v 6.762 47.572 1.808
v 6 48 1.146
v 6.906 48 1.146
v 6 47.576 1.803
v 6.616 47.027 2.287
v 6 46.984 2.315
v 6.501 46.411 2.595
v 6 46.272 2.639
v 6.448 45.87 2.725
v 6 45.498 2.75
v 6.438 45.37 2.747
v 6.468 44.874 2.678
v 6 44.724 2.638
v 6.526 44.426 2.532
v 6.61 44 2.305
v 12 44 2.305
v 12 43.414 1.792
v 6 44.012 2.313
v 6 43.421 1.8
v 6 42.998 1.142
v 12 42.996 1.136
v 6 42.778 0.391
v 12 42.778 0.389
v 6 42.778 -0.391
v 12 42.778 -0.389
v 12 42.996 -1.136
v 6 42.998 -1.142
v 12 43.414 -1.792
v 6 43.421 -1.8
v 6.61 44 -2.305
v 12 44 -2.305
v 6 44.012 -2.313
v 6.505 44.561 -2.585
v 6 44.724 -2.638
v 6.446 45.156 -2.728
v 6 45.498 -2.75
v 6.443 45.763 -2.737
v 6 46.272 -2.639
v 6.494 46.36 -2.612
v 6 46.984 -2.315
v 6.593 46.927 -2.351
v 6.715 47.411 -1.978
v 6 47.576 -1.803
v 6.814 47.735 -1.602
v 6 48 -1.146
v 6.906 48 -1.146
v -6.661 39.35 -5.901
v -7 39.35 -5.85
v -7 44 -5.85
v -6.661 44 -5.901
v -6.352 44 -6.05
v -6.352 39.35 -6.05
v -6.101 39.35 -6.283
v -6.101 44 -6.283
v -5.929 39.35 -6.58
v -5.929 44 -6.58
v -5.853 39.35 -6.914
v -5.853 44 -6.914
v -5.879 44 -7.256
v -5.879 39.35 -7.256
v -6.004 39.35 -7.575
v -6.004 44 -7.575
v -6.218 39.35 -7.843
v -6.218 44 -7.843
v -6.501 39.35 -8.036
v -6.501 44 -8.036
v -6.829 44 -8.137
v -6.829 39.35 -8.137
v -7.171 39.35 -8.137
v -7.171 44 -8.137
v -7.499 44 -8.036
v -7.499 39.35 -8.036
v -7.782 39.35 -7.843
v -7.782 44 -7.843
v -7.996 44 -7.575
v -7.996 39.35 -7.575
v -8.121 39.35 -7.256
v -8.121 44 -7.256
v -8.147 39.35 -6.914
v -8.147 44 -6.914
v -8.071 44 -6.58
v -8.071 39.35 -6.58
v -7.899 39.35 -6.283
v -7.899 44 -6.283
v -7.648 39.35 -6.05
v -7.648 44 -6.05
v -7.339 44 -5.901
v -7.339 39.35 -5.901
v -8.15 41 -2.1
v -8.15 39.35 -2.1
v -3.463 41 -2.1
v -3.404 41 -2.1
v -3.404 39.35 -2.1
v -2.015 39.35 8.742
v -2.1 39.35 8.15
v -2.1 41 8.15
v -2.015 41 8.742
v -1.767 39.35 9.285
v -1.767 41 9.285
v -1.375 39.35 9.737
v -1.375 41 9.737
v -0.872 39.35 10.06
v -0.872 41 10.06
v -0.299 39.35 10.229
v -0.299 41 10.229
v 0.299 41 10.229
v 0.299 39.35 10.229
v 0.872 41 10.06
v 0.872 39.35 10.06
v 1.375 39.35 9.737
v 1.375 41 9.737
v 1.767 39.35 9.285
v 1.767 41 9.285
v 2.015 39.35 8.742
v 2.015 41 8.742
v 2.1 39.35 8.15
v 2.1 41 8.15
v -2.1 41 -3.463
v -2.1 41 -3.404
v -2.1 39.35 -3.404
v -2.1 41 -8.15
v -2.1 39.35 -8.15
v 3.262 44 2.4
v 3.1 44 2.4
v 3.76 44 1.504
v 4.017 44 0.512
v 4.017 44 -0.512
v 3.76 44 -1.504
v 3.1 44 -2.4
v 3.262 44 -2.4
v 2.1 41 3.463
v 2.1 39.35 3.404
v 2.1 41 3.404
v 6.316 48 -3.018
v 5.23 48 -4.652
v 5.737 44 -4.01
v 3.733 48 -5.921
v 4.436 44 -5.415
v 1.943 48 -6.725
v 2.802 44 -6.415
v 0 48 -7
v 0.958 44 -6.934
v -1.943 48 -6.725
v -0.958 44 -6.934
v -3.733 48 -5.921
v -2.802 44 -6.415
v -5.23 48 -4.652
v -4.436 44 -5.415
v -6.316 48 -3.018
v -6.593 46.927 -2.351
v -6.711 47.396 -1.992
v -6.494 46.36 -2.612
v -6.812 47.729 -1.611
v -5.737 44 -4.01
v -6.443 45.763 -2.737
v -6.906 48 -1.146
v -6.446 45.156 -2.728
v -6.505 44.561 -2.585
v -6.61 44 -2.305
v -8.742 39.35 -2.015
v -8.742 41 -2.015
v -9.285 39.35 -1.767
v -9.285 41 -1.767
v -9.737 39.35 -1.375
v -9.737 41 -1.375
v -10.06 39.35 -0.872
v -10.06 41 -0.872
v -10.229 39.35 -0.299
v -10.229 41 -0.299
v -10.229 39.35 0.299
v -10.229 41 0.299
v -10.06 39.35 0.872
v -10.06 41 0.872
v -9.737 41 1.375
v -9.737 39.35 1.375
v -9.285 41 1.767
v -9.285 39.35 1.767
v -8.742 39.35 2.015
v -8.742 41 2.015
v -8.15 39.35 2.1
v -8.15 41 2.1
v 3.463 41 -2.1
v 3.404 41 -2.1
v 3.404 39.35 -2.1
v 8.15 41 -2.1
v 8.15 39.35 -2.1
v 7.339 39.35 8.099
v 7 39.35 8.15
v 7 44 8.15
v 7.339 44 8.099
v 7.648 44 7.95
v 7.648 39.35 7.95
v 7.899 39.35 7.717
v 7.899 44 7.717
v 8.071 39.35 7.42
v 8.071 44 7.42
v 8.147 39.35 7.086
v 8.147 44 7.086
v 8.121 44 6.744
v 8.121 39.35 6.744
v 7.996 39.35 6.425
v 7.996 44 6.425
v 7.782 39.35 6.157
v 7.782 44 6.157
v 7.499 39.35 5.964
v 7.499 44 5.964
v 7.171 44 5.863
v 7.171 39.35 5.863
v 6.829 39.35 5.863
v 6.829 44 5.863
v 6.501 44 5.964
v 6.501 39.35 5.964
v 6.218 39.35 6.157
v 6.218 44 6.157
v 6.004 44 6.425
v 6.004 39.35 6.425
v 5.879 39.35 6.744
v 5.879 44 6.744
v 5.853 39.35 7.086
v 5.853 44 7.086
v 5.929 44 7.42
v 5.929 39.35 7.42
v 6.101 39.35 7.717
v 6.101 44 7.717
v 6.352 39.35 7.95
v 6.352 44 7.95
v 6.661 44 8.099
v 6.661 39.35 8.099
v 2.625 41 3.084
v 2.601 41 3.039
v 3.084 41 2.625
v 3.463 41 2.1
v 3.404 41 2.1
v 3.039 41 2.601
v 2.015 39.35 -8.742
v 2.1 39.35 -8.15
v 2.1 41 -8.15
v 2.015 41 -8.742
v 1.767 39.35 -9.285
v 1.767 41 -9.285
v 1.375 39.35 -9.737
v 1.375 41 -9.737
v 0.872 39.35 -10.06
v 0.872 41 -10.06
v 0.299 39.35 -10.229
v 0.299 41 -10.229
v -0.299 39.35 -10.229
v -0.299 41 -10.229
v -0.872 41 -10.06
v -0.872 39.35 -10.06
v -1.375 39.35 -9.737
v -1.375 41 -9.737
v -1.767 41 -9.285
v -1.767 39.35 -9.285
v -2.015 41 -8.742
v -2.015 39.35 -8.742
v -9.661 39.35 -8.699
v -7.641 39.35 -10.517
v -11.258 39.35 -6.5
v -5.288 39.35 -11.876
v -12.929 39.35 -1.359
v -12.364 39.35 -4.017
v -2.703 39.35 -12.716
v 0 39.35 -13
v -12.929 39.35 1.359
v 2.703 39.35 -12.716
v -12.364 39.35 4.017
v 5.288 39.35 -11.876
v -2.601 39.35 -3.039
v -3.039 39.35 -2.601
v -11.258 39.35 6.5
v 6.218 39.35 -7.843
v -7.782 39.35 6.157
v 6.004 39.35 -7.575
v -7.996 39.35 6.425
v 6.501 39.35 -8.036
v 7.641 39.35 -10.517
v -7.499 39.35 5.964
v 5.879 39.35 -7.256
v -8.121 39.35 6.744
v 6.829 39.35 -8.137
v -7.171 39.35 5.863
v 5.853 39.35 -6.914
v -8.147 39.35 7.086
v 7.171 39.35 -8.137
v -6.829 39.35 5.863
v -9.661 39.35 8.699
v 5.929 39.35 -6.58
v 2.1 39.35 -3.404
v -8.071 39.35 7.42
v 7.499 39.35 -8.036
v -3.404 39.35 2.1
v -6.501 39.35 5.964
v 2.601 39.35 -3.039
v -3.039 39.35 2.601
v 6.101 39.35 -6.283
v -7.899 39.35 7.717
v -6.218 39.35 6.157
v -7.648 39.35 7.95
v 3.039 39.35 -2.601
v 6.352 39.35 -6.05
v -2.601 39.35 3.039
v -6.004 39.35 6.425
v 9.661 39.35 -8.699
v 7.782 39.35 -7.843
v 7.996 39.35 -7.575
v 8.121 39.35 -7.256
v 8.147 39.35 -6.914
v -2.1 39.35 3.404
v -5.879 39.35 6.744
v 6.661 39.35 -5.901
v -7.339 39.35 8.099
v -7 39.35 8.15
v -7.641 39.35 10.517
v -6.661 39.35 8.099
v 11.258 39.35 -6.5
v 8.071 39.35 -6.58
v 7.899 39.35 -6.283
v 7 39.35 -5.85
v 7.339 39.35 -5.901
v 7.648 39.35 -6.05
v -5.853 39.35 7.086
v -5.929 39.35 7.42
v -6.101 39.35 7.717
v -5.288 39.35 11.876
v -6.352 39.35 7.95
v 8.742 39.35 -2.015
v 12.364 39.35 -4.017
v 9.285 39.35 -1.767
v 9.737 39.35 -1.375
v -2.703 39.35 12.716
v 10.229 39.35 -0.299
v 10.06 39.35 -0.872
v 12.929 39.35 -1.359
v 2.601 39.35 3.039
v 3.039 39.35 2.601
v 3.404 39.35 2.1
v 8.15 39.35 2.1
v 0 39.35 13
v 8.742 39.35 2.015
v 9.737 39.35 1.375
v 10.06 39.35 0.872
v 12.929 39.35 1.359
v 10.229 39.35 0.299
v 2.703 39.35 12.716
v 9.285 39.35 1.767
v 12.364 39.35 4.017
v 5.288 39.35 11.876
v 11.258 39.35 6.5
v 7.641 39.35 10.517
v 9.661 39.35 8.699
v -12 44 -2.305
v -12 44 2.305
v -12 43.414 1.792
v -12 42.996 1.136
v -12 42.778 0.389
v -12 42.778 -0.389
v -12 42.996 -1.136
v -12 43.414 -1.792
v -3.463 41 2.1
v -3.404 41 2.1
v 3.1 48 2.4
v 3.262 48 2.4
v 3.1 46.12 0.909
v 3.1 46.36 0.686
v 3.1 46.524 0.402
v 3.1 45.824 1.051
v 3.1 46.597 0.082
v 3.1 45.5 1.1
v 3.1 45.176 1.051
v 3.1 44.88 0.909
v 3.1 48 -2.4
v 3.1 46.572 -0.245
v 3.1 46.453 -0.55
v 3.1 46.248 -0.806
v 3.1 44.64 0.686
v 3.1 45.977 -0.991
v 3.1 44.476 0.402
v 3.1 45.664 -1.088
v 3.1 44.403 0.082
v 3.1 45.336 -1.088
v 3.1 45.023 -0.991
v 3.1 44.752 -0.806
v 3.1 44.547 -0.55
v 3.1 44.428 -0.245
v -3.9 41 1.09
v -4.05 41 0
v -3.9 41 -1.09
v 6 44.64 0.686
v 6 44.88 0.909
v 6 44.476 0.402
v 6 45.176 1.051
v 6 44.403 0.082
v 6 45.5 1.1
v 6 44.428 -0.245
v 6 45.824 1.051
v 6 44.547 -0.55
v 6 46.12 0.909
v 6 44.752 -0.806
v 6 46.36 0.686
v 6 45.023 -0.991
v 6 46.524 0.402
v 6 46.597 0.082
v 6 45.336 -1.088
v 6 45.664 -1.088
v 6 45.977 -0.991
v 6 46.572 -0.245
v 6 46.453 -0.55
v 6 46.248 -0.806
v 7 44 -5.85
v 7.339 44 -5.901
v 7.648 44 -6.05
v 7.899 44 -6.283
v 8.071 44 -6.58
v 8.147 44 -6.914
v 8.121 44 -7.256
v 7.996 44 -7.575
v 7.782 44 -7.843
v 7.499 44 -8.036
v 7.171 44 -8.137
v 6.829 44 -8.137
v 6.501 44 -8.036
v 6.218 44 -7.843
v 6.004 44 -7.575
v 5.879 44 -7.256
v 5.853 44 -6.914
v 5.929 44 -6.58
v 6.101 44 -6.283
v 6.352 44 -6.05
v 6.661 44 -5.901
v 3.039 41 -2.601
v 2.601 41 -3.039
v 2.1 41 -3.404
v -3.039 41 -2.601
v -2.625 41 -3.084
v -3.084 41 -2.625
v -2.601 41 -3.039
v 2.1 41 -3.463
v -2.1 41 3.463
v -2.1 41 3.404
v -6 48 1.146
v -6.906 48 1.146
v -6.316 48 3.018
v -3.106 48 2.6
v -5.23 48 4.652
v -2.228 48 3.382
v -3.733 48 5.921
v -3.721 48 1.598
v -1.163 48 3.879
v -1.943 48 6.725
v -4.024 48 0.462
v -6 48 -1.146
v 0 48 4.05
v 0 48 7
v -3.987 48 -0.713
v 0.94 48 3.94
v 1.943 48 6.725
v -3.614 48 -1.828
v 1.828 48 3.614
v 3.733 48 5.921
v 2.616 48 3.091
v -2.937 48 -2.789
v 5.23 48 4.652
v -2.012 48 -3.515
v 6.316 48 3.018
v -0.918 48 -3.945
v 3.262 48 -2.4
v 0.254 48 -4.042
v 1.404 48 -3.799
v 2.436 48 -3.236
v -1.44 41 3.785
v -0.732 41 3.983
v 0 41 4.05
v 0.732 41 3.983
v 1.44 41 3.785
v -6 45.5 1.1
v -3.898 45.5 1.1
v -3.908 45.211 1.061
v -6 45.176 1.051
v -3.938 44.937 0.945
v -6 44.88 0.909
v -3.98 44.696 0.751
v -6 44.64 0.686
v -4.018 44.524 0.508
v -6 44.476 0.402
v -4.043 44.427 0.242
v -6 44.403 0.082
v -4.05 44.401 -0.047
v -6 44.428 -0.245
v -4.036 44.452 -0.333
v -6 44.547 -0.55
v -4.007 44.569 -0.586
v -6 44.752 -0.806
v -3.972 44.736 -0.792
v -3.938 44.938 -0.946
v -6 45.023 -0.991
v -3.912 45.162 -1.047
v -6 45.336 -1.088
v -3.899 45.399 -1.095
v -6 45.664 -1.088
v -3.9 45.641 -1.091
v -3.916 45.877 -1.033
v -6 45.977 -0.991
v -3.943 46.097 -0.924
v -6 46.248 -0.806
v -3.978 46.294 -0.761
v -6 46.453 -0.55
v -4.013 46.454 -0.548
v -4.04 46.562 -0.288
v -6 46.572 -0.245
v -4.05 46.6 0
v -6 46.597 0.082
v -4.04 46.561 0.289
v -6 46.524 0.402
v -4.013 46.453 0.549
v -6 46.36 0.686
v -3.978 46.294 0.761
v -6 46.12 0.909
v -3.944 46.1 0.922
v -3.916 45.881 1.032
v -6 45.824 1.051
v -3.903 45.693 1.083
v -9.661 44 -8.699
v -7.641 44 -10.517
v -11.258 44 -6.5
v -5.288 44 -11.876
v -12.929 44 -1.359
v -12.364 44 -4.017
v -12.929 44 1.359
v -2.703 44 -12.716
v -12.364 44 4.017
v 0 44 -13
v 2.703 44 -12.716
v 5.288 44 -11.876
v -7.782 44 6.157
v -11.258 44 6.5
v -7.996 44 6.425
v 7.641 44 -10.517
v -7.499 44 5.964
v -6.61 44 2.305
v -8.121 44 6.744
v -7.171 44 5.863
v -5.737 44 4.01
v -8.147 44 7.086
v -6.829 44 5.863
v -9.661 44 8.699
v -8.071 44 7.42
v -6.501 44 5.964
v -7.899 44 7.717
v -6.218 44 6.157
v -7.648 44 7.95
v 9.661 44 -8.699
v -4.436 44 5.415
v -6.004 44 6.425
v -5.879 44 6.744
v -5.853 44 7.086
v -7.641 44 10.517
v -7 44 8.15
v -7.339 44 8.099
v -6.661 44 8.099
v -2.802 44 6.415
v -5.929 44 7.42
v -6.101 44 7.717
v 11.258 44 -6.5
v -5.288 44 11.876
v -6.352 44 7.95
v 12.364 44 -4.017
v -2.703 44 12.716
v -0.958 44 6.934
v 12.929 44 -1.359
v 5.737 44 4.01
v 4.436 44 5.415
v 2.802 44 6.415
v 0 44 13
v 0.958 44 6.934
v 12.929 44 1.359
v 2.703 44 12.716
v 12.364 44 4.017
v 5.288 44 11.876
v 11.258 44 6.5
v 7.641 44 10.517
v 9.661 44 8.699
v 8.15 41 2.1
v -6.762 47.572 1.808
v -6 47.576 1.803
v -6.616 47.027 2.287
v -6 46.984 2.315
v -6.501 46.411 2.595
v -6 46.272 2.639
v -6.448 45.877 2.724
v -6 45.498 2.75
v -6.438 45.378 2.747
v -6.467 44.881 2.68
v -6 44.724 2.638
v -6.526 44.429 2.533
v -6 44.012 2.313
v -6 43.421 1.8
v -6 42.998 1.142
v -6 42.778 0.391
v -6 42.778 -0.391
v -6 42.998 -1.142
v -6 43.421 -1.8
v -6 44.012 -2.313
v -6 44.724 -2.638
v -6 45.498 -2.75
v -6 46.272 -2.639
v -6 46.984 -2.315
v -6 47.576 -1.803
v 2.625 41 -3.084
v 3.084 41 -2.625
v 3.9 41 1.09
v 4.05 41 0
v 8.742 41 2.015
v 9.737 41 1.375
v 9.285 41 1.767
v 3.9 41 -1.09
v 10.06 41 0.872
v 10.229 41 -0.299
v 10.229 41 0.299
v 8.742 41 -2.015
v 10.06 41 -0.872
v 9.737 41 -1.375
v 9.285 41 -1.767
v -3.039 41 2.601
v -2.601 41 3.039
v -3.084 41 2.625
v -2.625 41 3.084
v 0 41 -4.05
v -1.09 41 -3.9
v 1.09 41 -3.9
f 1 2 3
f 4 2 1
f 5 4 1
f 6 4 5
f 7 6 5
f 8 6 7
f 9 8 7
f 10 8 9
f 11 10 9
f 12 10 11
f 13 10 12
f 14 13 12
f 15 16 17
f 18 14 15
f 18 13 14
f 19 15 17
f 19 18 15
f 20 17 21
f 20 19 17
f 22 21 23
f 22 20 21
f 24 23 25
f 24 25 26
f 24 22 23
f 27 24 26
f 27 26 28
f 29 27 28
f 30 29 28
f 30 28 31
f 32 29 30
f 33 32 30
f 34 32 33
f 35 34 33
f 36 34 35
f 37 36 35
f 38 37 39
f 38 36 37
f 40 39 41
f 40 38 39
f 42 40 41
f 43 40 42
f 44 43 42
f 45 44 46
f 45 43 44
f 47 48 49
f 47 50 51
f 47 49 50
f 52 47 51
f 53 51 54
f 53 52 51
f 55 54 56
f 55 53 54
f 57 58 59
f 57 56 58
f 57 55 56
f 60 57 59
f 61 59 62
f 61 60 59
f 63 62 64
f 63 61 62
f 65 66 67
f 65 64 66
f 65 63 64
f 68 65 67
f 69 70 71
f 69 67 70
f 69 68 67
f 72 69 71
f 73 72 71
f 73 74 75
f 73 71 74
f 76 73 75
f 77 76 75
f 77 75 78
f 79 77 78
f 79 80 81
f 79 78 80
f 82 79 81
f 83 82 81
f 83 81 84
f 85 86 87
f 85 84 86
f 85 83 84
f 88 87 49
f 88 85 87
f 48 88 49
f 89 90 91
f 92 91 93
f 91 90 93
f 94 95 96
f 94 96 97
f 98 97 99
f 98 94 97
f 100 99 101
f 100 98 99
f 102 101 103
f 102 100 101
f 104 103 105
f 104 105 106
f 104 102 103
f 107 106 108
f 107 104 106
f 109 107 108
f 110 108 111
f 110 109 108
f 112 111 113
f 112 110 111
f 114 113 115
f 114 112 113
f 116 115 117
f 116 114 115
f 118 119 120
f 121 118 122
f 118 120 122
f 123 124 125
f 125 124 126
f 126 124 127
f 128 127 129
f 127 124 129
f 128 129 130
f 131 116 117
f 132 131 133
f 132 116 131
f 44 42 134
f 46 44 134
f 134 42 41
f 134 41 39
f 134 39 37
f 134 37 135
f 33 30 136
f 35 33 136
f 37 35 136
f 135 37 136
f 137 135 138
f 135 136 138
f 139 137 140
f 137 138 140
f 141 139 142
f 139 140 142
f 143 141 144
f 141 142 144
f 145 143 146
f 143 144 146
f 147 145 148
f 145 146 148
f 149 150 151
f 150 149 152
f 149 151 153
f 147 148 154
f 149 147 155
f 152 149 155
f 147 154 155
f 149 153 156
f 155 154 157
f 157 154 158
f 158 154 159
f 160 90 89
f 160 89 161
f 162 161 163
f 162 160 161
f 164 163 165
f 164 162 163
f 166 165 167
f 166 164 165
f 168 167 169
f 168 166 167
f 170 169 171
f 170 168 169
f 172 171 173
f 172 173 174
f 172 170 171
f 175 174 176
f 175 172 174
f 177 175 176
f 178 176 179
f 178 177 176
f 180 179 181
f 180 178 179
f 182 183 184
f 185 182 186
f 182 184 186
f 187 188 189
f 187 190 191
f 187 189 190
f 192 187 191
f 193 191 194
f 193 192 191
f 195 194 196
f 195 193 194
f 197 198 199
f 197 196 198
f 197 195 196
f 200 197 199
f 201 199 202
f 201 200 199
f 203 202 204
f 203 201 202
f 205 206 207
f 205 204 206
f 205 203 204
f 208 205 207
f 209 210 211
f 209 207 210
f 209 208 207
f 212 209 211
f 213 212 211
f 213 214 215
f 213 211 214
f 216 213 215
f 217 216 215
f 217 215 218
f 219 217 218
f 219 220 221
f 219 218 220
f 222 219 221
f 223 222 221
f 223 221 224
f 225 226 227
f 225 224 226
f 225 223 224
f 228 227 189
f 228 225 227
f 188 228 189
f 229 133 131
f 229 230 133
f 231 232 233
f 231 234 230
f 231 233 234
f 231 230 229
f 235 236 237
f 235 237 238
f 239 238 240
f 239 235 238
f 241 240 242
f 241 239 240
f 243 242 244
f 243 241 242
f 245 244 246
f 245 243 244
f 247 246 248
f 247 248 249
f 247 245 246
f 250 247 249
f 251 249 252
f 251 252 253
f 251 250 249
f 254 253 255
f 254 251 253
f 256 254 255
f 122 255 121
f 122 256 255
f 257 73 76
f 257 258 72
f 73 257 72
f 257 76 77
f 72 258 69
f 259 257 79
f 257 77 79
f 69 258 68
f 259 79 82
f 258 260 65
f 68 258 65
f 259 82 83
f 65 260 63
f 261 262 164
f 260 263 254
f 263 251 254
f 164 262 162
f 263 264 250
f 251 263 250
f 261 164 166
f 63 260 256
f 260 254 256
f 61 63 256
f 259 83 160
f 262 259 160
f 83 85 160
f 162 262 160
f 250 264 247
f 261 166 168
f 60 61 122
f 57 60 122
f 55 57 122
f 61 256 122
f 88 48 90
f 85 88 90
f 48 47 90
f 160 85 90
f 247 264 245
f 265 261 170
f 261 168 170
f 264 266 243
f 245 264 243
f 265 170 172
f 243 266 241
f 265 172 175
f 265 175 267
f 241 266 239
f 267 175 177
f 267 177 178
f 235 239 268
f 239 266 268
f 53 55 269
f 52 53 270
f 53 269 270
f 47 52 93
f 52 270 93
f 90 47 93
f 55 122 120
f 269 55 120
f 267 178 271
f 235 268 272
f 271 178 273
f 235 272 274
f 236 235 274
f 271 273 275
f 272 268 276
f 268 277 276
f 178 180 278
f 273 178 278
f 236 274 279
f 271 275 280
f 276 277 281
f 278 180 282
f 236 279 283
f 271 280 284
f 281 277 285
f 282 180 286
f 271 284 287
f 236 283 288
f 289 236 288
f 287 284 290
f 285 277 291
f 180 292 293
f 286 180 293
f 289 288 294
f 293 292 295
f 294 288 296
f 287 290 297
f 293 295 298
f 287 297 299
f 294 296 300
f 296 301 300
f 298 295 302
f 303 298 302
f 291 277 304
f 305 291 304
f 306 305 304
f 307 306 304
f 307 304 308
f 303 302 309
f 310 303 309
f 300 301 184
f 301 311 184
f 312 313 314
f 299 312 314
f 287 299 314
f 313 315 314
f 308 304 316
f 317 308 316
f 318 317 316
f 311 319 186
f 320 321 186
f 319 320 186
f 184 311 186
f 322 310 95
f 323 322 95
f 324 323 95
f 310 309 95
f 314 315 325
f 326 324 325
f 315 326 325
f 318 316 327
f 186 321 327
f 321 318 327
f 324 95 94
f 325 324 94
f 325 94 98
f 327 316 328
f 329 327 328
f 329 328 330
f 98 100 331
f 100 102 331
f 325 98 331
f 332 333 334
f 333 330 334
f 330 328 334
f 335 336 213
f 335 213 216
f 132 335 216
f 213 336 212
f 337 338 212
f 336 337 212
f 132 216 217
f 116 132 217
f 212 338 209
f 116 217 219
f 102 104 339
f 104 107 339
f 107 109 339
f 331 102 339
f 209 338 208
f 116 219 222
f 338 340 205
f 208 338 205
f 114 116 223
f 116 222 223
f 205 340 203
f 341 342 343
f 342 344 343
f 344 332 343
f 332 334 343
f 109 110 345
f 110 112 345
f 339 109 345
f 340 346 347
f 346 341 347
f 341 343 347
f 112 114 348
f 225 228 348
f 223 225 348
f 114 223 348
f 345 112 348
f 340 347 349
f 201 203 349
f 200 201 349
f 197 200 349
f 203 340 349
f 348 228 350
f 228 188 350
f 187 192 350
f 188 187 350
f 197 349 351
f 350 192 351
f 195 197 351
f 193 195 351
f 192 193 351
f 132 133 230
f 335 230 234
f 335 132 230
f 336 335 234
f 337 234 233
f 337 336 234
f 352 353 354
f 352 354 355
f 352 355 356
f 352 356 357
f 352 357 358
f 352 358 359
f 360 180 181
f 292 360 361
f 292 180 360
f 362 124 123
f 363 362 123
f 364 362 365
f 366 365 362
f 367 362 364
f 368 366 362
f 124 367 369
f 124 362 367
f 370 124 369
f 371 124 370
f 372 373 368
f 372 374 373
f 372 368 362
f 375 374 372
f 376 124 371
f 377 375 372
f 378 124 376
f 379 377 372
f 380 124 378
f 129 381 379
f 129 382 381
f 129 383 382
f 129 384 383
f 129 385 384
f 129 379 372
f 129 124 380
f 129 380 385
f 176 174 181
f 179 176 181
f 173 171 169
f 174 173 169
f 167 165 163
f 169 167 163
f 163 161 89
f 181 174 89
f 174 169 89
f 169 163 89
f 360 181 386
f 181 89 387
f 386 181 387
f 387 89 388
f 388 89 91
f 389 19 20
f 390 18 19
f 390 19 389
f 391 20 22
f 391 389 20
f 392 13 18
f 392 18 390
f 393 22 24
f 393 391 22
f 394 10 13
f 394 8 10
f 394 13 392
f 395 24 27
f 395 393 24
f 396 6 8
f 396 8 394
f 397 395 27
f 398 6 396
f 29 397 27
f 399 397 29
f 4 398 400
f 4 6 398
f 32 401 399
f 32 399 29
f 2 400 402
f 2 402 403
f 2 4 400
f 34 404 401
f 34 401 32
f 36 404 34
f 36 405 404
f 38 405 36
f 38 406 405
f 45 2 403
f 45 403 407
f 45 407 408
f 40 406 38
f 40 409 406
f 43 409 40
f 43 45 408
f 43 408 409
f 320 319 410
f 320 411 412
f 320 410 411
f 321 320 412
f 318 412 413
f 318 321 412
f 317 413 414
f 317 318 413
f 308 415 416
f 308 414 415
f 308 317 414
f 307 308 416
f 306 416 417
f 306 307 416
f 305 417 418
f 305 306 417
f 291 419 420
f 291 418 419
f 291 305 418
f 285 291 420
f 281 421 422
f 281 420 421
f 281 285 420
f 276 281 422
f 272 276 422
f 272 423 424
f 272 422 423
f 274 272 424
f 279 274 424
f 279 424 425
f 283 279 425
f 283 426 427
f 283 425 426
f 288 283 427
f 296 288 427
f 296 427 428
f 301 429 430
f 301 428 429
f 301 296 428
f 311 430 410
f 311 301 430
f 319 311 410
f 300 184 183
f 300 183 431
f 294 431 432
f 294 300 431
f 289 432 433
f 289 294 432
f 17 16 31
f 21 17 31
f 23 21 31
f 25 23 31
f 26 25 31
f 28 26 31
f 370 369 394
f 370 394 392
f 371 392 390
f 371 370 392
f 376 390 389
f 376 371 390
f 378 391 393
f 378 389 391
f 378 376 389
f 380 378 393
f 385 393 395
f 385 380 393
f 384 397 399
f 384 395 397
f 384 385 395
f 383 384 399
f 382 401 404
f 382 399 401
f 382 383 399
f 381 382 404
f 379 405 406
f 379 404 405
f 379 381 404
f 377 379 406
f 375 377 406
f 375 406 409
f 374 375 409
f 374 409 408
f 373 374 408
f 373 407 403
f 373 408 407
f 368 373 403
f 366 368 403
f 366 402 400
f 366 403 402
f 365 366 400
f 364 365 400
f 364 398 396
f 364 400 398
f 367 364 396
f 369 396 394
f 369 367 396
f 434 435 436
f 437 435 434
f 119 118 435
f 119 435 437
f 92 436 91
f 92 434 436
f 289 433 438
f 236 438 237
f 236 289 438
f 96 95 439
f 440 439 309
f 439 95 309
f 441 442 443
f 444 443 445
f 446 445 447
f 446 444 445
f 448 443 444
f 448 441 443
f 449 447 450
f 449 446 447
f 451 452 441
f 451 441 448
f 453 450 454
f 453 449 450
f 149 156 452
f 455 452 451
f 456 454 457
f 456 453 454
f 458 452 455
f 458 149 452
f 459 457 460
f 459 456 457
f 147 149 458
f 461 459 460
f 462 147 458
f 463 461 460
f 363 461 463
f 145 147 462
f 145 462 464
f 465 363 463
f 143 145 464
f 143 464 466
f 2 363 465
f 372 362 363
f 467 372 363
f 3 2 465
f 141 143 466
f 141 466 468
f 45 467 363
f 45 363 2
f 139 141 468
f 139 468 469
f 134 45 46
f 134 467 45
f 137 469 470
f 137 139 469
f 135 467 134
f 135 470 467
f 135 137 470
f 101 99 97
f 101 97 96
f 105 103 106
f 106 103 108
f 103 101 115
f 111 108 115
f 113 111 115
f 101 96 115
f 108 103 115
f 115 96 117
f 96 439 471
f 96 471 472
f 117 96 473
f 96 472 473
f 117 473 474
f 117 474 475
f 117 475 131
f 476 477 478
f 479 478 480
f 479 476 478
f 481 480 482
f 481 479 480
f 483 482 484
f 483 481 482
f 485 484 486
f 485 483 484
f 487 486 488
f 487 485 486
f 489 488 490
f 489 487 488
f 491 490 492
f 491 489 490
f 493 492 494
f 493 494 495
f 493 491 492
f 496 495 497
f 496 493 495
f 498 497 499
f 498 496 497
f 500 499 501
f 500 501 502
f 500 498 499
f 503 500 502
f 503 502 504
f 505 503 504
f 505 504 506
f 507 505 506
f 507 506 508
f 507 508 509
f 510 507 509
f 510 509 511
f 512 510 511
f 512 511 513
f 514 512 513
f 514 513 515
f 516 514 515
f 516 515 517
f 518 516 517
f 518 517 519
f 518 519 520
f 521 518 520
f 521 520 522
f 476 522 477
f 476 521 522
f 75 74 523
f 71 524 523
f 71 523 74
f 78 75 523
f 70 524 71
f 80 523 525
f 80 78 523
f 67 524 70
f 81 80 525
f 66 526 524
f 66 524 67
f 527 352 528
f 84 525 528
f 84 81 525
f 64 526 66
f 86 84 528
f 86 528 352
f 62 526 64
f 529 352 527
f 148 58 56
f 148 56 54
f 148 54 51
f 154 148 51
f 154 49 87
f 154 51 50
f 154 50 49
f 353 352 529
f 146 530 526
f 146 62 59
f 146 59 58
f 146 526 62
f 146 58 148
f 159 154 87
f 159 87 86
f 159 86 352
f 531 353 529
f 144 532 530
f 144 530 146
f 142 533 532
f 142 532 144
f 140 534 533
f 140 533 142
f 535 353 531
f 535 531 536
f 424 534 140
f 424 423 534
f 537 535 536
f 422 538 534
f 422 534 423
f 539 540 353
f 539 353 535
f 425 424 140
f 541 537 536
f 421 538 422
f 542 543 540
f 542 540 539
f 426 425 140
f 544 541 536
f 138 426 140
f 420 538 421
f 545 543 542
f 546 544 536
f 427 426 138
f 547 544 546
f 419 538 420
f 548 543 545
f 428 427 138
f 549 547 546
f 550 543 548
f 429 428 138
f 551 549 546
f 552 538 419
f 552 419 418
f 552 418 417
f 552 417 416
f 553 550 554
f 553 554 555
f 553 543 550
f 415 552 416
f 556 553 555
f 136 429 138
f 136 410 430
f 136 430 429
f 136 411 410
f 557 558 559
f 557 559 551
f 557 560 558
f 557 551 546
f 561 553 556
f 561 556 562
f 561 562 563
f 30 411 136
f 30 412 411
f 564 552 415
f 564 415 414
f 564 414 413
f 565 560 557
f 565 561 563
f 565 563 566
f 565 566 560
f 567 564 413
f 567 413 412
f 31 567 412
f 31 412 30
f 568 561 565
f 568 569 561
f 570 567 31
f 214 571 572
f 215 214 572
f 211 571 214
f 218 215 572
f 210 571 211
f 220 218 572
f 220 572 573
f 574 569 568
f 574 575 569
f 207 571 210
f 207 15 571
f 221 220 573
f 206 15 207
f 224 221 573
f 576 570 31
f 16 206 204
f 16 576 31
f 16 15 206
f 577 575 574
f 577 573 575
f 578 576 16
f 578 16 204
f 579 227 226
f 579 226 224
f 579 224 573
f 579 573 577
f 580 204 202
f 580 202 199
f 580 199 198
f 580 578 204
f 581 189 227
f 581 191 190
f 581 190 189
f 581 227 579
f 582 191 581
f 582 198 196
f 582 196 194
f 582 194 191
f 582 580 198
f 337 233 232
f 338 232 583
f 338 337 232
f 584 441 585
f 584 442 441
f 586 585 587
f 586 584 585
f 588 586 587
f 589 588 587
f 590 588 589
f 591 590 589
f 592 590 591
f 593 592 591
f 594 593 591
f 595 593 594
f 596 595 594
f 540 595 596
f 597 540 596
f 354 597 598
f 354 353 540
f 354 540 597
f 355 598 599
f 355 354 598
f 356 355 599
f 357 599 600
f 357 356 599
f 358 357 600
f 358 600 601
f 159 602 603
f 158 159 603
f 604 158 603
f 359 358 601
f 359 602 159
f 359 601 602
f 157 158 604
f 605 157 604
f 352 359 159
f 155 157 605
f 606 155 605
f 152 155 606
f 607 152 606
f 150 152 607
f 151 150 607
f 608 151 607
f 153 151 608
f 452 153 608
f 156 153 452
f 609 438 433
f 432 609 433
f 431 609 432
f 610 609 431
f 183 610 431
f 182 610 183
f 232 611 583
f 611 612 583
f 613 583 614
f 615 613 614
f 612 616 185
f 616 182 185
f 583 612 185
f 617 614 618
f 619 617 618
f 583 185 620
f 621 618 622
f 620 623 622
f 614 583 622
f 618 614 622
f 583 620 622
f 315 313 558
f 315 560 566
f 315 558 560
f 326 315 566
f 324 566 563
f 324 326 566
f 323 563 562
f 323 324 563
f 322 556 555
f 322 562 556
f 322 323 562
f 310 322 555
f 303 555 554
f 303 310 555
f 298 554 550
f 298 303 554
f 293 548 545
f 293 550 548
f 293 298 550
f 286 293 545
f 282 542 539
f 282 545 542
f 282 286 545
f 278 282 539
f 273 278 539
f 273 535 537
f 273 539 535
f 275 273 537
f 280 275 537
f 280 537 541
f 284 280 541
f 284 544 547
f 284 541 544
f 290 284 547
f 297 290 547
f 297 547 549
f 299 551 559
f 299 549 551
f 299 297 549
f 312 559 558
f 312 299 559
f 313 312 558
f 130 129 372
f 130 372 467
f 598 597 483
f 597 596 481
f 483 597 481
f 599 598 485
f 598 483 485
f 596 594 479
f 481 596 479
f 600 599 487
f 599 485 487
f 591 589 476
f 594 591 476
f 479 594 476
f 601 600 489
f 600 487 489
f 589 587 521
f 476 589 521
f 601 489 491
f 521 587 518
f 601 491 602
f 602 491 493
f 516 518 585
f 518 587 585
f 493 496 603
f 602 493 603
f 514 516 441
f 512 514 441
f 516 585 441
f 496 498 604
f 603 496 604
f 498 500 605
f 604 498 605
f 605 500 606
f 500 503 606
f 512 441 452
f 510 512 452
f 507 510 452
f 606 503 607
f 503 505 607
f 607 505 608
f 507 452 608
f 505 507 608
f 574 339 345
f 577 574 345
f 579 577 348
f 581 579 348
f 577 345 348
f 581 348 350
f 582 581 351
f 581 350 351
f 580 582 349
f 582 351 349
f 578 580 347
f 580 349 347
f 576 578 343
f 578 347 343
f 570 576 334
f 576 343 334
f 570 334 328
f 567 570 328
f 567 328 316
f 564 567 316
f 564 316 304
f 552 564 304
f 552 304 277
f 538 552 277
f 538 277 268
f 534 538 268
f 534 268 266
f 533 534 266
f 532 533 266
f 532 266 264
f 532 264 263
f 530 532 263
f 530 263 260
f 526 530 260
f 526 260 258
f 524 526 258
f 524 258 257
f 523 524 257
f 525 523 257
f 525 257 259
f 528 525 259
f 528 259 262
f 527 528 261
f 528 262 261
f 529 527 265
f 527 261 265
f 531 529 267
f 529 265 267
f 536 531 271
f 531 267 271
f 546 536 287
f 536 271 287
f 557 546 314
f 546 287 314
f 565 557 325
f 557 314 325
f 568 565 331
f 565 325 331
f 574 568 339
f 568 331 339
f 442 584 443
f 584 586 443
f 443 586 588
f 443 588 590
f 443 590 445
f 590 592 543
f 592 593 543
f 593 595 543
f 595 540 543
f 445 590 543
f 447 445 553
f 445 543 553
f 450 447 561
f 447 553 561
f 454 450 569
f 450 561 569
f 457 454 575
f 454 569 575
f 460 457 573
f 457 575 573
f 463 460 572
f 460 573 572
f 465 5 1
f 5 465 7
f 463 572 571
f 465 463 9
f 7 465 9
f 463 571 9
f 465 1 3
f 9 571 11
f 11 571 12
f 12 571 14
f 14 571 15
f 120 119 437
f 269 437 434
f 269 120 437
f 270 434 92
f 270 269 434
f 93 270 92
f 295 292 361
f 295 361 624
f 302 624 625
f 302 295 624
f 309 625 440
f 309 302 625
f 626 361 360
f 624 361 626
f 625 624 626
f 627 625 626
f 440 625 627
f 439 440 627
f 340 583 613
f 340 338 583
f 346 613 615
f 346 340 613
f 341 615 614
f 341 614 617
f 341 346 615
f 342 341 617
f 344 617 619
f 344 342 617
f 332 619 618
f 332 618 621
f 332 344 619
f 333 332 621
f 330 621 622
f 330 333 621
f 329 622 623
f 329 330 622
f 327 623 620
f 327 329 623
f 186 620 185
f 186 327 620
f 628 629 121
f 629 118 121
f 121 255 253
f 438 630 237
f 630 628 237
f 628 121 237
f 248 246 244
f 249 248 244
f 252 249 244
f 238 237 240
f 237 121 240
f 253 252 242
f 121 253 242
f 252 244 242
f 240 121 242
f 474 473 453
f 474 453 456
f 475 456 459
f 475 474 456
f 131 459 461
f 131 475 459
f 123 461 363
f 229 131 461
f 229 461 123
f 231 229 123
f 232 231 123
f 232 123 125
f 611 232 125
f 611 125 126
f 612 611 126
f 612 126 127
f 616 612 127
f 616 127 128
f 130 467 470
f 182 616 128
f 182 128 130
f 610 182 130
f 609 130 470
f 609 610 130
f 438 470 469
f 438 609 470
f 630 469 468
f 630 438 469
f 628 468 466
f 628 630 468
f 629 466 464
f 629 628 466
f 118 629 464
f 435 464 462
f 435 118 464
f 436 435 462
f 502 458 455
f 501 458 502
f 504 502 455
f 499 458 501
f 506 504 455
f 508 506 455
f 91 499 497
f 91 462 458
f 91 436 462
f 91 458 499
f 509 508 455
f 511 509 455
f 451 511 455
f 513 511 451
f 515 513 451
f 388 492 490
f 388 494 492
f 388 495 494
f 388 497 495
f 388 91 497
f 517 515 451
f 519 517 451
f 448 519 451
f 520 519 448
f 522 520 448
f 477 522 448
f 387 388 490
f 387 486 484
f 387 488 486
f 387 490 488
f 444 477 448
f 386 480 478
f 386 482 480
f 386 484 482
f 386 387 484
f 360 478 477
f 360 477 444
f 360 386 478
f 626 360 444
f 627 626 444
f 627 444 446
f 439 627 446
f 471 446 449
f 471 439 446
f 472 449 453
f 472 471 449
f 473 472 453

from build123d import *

# Parameters (mm, degrees)
STOCK_HORN_DRIVE_FLANGE_START              = 41
STOCK_HORN_DRIVE_FLANGE_PROFILE_R          = 13
STOCK_HORN_DRIVE_FLANGE_PROFILE_R_2        = 4.05
STOCK_HORN_DRIVE_FLANGE_DEPTH              = 3
D_COUPLING_RING_START                      = 44
D_COUPLING_RING_PROFILE_R                  = 7
D_COUPLING_RING_PROFILE_R_2                = 4.05
D_COUPLING_RING_DEPTH                      = 4
D_KEY_LAND_START                           = 44
D_KEY_LAND_PROFILE_W                       = 2.9
D_KEY_LAND_PROFILE_H                       = 4.8
D_KEY_LAND_DEPTH                           = 4
CAPTURED_HORN_KEY_BOSS_START               = 39.35
CAPTURED_HORN_KEY_BOSS_PROFILE_R           = 13
CAPTURED_HORN_KEY_BOSS_DEPTH               = 1.65
KEY_POCKET_HUB_START                       = 39.35
STOCK_HORN_POCKET_HUB_R                    = 3.55
KEY_POCKET_HUB_DEPTH                       = 1.65
KEY_POCKET_HORIZONTAL_START                = 39.35
STOCK_HORN_POCKET_HORIZONTAL_W             = 16.3
STOCK_HORN_POCKET_HORIZONTAL_H             = 4.2
KEY_POCKET_HORIZONTAL_DEPTH                = 1.65
KEY_POCKET_VERTICAL_START                  = 39.35
STOCK_HORN_POCKET_VERTICAL_W               = 4.2
STOCK_HORN_POCKET_VERTICAL_H               = 16.3
KEY_POCKET_VERTICAL_DEPTH                  = 1.65
KEY_POCKET_ROUNDED_TIPS_START              = 39.35
STOCK_HORN_POCKET_ROUNDED_TIPS_R           = 2.1
KEY_POCKET_ROUNDED_TIPS_DEPTH              = 1.65
UNMODIFIED_HORN_CAPTURE_M2_START           = -50
UNMODIFIED_HORN_CAPTURE_M2_PROFILE_R       = 1.15
UNMODIFIED_HORN_CAPTURE_M2_DEPTH           = 102.400389104
HUB_CLEARANCE_IN_KEY_BOSS_ONLY_START       = 39.35
HORN_CENTER_HUB_CLEARANCE_R                = 4
HUB_CLEARANCE_IN_KEY_BOSS_ONLY_DEPTH       = 1.65
YAW_POSITIVE_RETENTION_CROSSBOLT_START     = -10
YAW_POSITIVE_RETENTION_CROSSBOLT_PROFILE_R = 1.1
YAW_POSITIVE_RETENTION_CROSSBOLT_DEPTH     = 62.400389104
CROSSBOLT_FLAT_SEAT_CUT_12_START           = -12
CROSSBOLT_FLAT_SEAT_12_R                   = 2.75
CROSSBOLT_FLAT_SEAT_CUT_12_DEPTH           = 6
CROSSBOLT_FLAT_SEAT_CUT_6_START            = 6
CROSSBOLT_FLAT_SEAT_6_R                    = 2.75
CROSSBOLT_FLAT_SEAT_CUT_6_DEPTH            = 6


with BuildPart() as part:
    # Stock_horn_drive_flange_profile → Stock_horn_drive_flange (new body)
    with BuildSketch(Plane(origin=(0, 0, 0), x_dir=(1, 0, 0), z_dir=(0, 1, 0)).offset(STOCK_HORN_DRIVE_FLANGE_START)):
        with Locations(Location((0, 0, 0), (0, 0, 270))):
            Circle(STOCK_HORN_DRIVE_FLANGE_PROFILE_R)
        with Locations(Location((0, 0, 0), (0, 0, 270))):
            Circle(STOCK_HORN_DRIVE_FLANGE_PROFILE_R_2, mode=Mode.SUBTRACT)
    extrude(amount=STOCK_HORN_DRIVE_FLANGE_DEPTH)

    # D_coupling_ring_profile → D_coupling_ring (add)
    with BuildSketch(Plane(origin=(0, 0, 0), x_dir=(1, 0, 0), z_dir=(0, 1, 0)).offset(D_COUPLING_RING_START)):
        with Locations(Location((0, 0, 0), (0, 0, 270))):
            Circle(D_COUPLING_RING_PROFILE_R)
        with Locations(Location((0, 0, 0), (0, 0, 270))):
            Circle(D_COUPLING_RING_PROFILE_R_2, mode=Mode.SUBTRACT)
    extrude(amount=D_COUPLING_RING_DEPTH)

    # D_key_land_profile → D_key_land (add)
    with BuildSketch(Plane(origin=(0, 0, 0), x_dir=(1, 0, 0), z_dir=(0, 1, 0)).offset(D_KEY_LAND_START)):
        with Locations((4.55, 0)):
            Rectangle(D_KEY_LAND_PROFILE_W, D_KEY_LAND_PROFILE_H)
    extrude(amount=D_KEY_LAND_DEPTH)

    # Captured_horn_key_boss_profile → Captured_horn_key_boss (add)
    with BuildSketch(Plane(origin=(0, 0, 0), x_dir=(1, 0, 0), z_dir=(0, 1, 0)).offset(CAPTURED_HORN_KEY_BOSS_START)):
        with Locations(Location((0, 0, 0), (0, 0, 270))):
            Circle(CAPTURED_HORN_KEY_BOSS_PROFILE_R)
    extrude(amount=CAPTURED_HORN_KEY_BOSS_DEPTH)

    # Stock_horn_pocket_Hub → Key_pocket_Hub (cut)
    with BuildSketch(Plane(origin=(0, 0, 0), x_dir=(1, 0, 0), z_dir=(0, 1, 0)).offset(KEY_POCKET_HUB_START)):
        with Locations(Location((0, 0, 0), (0, 0, 270))):
            Circle(STOCK_HORN_POCKET_HUB_R)
    extrude(amount=KEY_POCKET_HUB_DEPTH, mode=Mode.SUBTRACT)

    # Stock_horn_pocket_Horizontal → Key_pocket_Horizontal (cut)
    with BuildSketch(Plane(origin=(0, 0, 0), x_dir=(1, 0, 0), z_dir=(0, 1, 0)).offset(KEY_POCKET_HORIZONTAL_START)):
        Rectangle(STOCK_HORN_POCKET_HORIZONTAL_W, STOCK_HORN_POCKET_HORIZONTAL_H)
    extrude(amount=KEY_POCKET_HORIZONTAL_DEPTH, mode=Mode.SUBTRACT)

    # Stock_horn_pocket_Vertical → Key_pocket_Vertical (cut)
    with BuildSketch(Plane(origin=(0, 0, 0), x_dir=(1, 0, 0), z_dir=(0, 1, 0)).offset(KEY_POCKET_VERTICAL_START)):
        Rectangle(STOCK_HORN_POCKET_VERTICAL_W, STOCK_HORN_POCKET_VERTICAL_H)
    extrude(amount=KEY_POCKET_VERTICAL_DEPTH, mode=Mode.SUBTRACT)

    # Stock_horn_pocket_Rounded_tips → Key_pocket_Rounded_tips (cut)
    with BuildSketch(Plane(origin=(0, 0, 0), x_dir=(1, 0, 0), z_dir=(0, 1, 0)).offset(KEY_POCKET_ROUNDED_TIPS_START)):
        with Locations((8.15, 0)):
            Circle(STOCK_HORN_POCKET_ROUNDED_TIPS_R)
        with Locations((-8.15, 0)):
            Circle(STOCK_HORN_POCKET_ROUNDED_TIPS_R)
        with Locations((0, 8.15)):
            Circle(STOCK_HORN_POCKET_ROUNDED_TIPS_R)
        with Locations((0, -8.15)):
            Circle(STOCK_HORN_POCKET_ROUNDED_TIPS_R)
    extrude(amount=KEY_POCKET_ROUNDED_TIPS_DEPTH, mode=Mode.SUBTRACT)

    # Unmodified_horn_capture_M2_profile → Unmodified_horn_capture_M2 (cut, through all)
    with BuildSketch(Plane(origin=(0, 0, 0), x_dir=(1, 0, 0), z_dir=(0, 1, 0)).offset(UNMODIFIED_HORN_CAPTURE_M2_START)):
        with Locations(Location((7, 7, 0), (0, 0, 270))):
            Circle(UNMODIFIED_HORN_CAPTURE_M2_PROFILE_R)
        with Locations(Location((-7, 7, 0), (0, 0, 270))):
            Circle(UNMODIFIED_HORN_CAPTURE_M2_PROFILE_R)
        with Locations(Location((-7, -7, 0), (0, 0, 270))):
            Circle(UNMODIFIED_HORN_CAPTURE_M2_PROFILE_R)
        with Locations(Location((7, -7, 0), (0, 0, 270))):
            Circle(UNMODIFIED_HORN_CAPTURE_M2_PROFILE_R)
    extrude(amount=UNMODIFIED_HORN_CAPTURE_M2_DEPTH, mode=Mode.SUBTRACT)

    # Horn_center_hub_clearance → Hub_clearance_in_key_boss_only (cut)
    with BuildSketch(Plane(origin=(0, 0, 0), x_dir=(1, 0, 0), z_dir=(0, 1, 0)).offset(HUB_CLEARANCE_IN_KEY_BOSS_ONLY_START)):
        Circle(HORN_CENTER_HUB_CLEARANCE_R)
    extrude(amount=HUB_CLEARANCE_IN_KEY_BOSS_ONLY_DEPTH, mode=Mode.SUBTRACT)

    # Yaw_positive_retention_crossbolt_profile → Yaw_positive_retention_crossbolt (cut, through all)
    with BuildSketch(Plane(origin=(0, 0, 0), x_dir=(0, 0, -1), z_dir=(1, 0, 0)).offset(YAW_POSITIVE_RETENTION_CROSSBOLT_START)):
        with Locations(Location((0, 45.5, 0), (0, 0, 180))):
            Circle(YAW_POSITIVE_RETENTION_CROSSBOLT_PROFILE_R)
    extrude(amount=YAW_POSITIVE_RETENTION_CROSSBOLT_DEPTH, mode=Mode.SUBTRACT)

    # Crossbolt_flat_seat_-12 → Crossbolt_flat_seat_cut_-12 (cut)
    with BuildSketch(Plane(origin=(0, 0, 0), x_dir=(0, 0, -1), z_dir=(1, 0, 0)).offset(CROSSBOLT_FLAT_SEAT_CUT_12_START)):
        with Locations((0, 45.5)):
            Circle(CROSSBOLT_FLAT_SEAT_12_R)
    extrude(amount=CROSSBOLT_FLAT_SEAT_CUT_12_DEPTH, mode=Mode.SUBTRACT)

    # Crossbolt_flat_seat_6 → Crossbolt_flat_seat_cut_6 (cut)
    with BuildSketch(Plane(origin=(0, 0, 0), x_dir=(0, 0, -1), z_dir=(1, 0, 0)).offset(CROSSBOLT_FLAT_SEAT_CUT_6_START)):
        with Locations((0, 45.5)):
            Circle(CROSSBOLT_FLAT_SEAT_6_R)
    extrude(amount=CROSSBOLT_FLAT_SEAT_CUT_6_DEPTH, mode=Mode.SUBTRACT)


solid = part.part
